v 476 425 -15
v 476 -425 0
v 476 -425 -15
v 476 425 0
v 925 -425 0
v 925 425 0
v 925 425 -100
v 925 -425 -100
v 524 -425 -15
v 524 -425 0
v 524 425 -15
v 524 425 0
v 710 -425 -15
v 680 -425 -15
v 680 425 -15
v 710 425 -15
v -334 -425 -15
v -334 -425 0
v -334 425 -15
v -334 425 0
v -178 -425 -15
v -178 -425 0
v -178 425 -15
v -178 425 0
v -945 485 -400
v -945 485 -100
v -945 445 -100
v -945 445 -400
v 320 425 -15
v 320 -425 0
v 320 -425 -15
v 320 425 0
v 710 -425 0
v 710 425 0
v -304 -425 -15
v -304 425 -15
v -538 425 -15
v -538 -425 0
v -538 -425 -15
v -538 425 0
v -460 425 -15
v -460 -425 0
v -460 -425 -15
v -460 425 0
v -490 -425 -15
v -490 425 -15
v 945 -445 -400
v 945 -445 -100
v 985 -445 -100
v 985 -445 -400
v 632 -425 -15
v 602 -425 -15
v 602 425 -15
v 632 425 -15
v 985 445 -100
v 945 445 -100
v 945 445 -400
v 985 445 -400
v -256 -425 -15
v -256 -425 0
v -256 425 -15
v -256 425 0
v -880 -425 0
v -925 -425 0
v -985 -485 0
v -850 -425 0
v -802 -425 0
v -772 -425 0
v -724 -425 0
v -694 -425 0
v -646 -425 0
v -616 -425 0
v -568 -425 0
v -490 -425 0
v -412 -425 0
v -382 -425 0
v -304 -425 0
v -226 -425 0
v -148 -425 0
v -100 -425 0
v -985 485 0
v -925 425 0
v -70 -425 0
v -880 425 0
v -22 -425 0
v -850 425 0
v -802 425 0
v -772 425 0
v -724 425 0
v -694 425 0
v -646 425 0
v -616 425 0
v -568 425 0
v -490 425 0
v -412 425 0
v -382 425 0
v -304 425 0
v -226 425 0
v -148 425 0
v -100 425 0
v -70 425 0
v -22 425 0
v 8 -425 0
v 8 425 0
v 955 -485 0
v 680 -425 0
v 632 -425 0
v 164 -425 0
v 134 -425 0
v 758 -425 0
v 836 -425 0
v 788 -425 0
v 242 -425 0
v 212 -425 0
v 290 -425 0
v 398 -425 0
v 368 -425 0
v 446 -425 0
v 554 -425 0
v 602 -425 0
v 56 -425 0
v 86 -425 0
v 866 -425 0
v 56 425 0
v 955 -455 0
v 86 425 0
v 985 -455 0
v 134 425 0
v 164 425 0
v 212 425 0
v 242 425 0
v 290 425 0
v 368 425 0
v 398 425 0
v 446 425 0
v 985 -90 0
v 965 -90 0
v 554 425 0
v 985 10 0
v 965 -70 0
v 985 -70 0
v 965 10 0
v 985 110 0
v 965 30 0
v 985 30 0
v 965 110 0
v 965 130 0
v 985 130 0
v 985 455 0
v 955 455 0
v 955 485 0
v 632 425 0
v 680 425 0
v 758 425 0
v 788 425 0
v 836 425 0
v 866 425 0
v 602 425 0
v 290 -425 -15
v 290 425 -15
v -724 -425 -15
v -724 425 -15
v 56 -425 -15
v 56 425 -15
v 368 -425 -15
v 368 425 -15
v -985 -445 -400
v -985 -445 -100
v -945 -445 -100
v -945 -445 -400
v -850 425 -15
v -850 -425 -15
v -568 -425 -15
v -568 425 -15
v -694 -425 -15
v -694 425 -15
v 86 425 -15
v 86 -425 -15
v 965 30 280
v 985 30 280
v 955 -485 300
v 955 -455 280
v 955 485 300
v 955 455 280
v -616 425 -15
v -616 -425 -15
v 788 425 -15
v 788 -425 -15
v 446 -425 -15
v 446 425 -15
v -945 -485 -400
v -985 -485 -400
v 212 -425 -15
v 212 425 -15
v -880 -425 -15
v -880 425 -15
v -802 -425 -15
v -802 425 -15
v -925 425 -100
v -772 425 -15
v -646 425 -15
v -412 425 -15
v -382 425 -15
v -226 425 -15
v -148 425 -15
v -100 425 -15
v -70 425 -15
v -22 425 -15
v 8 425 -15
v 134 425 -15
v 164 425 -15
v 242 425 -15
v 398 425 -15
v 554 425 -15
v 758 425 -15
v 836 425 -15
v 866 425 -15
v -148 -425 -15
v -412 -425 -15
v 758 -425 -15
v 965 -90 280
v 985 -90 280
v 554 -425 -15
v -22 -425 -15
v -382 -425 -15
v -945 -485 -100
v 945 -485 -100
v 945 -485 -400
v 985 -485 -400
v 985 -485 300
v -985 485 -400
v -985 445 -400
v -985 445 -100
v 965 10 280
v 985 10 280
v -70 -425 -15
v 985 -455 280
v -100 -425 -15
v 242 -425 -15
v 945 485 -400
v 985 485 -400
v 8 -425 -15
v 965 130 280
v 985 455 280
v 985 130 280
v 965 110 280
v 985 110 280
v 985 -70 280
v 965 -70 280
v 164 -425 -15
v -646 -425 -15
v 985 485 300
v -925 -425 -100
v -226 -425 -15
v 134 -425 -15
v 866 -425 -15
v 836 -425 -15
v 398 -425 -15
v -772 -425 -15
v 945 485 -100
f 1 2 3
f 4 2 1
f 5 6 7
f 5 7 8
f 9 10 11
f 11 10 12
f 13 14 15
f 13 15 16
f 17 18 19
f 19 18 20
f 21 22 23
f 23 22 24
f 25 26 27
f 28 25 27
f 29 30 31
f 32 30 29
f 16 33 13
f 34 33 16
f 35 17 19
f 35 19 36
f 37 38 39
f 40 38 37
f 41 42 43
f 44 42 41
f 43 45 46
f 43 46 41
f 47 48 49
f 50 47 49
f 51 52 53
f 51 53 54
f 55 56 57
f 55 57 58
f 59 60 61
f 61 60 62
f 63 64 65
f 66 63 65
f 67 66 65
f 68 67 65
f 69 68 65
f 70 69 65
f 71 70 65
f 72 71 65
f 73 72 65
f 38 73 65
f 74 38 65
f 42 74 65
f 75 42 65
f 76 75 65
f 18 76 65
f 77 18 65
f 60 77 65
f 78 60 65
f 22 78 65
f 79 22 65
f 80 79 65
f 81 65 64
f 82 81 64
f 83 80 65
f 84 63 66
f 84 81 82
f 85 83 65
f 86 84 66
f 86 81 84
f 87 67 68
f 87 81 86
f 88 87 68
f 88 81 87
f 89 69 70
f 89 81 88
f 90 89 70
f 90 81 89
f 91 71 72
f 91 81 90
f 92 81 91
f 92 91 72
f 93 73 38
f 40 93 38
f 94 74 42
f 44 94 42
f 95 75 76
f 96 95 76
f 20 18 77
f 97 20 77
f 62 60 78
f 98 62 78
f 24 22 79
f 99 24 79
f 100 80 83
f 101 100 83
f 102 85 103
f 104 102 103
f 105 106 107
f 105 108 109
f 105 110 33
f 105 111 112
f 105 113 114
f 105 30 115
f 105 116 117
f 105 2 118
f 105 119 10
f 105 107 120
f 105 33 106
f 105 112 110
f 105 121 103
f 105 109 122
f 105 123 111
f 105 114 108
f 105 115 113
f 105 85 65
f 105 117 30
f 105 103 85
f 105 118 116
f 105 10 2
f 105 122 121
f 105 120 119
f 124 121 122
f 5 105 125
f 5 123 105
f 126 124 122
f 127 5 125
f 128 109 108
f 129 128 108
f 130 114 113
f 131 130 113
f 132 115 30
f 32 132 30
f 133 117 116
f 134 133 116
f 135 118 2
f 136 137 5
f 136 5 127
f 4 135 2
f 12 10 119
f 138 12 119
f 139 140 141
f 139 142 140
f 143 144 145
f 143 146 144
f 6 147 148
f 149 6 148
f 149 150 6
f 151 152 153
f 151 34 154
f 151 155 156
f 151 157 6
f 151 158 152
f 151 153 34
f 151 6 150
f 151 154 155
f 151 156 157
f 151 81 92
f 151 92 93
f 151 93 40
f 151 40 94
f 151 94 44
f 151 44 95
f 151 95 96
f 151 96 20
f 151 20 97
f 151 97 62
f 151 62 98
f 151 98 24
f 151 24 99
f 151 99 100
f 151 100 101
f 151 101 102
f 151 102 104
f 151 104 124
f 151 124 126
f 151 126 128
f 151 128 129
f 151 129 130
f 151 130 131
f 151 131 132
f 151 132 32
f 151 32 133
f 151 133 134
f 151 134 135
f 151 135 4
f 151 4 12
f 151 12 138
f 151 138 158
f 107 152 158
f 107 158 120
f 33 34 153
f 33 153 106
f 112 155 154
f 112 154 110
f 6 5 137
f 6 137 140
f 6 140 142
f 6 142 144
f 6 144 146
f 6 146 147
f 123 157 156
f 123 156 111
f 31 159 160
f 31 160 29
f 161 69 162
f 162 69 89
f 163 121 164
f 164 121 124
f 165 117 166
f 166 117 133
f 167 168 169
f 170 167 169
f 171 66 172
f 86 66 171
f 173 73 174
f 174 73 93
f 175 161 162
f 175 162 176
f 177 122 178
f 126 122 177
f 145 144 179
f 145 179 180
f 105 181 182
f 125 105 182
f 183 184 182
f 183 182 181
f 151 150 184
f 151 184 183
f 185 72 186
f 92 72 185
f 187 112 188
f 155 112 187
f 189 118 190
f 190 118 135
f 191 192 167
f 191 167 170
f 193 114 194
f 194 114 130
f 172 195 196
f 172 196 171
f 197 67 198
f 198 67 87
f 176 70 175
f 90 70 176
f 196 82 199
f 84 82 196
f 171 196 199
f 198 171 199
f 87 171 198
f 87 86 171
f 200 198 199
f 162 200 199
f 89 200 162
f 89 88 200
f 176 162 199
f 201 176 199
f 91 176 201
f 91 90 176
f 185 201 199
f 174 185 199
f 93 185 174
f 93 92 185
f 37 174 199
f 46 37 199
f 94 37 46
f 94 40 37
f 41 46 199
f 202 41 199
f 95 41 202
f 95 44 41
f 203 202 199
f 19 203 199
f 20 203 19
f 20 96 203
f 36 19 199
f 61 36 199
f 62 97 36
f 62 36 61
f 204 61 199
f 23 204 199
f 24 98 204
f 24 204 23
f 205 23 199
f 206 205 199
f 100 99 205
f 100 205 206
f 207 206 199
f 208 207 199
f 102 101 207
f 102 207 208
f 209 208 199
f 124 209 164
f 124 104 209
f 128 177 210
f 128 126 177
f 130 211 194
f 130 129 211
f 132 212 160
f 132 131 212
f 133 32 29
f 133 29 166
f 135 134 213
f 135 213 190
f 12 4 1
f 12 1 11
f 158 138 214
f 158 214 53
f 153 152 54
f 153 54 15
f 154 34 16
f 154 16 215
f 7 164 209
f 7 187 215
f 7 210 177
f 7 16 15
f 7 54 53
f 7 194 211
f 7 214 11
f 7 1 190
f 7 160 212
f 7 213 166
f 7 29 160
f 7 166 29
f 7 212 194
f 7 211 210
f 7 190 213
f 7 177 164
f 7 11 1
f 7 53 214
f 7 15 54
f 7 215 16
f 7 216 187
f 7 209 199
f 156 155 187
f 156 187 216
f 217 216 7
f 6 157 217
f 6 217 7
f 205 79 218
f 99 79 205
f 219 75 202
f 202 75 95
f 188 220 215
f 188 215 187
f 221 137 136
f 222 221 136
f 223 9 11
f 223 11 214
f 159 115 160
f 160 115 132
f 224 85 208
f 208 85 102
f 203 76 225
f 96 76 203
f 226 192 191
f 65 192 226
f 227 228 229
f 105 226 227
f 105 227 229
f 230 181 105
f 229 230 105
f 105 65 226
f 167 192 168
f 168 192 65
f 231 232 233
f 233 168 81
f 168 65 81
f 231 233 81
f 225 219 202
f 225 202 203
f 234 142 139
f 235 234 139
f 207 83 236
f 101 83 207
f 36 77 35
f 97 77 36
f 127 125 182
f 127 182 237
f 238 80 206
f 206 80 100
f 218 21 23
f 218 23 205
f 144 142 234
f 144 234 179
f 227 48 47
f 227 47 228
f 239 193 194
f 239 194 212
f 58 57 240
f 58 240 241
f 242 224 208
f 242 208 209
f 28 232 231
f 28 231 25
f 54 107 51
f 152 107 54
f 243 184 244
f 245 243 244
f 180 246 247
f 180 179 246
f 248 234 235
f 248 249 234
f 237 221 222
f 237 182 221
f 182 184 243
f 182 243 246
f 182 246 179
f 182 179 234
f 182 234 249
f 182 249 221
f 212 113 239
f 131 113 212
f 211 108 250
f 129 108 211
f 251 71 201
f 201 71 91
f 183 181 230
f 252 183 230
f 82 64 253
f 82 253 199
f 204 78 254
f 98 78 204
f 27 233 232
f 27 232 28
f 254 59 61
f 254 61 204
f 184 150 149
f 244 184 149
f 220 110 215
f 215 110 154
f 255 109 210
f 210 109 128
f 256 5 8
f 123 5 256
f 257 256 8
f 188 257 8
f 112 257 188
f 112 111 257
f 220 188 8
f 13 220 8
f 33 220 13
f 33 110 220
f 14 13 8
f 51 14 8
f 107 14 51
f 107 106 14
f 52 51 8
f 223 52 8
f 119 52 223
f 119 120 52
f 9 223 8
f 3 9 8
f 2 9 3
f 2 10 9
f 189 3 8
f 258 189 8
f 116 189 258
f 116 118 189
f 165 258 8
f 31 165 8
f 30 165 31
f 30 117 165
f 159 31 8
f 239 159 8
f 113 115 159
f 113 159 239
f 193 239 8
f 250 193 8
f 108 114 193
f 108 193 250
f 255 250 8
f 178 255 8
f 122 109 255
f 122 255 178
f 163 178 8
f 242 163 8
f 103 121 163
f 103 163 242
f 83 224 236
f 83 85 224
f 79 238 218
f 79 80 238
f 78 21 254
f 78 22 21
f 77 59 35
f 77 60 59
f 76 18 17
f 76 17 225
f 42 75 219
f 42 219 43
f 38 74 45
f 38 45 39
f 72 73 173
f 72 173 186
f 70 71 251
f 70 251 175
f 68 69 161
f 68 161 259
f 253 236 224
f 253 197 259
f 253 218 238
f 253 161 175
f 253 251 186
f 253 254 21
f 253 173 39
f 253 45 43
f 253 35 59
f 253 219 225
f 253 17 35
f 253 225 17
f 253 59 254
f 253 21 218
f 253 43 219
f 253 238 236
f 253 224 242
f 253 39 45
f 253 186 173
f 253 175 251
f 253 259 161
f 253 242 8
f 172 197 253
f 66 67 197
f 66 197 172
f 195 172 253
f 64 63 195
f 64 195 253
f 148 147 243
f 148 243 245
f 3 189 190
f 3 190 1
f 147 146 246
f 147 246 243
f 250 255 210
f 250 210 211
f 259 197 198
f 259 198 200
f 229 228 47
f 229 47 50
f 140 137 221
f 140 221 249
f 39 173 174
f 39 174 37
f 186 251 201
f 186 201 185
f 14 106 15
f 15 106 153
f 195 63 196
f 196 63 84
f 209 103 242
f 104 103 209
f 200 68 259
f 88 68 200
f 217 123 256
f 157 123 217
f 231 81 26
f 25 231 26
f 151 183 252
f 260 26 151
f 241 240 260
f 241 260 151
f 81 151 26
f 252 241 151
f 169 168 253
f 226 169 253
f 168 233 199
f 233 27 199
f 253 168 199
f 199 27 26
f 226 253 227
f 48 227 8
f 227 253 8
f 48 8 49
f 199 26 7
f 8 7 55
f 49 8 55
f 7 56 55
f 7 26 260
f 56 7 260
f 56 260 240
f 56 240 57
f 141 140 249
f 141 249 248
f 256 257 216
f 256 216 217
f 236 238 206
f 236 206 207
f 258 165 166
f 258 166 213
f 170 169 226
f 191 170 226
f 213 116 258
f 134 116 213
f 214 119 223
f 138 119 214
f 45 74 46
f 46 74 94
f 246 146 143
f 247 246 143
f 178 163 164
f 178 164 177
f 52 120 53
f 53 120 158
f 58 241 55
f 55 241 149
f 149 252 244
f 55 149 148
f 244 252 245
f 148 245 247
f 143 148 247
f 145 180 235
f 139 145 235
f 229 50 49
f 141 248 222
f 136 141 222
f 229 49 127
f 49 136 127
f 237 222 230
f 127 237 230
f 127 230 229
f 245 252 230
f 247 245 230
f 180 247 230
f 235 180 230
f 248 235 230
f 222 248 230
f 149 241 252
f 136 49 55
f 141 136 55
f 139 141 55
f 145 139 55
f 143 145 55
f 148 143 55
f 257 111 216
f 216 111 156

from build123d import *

# Parameters (mm, degrees)
F0_W     = 1970
F0_H     = 970
F0_W_2   = 30
F0_H_2   = 850
F1_DEPTH = 15
F2_DEPTH = 100
F3_W     = 30
F3_H     = 30
F3_W_2   = 20
F3_H_2   = 20
F4_DEPTH = 300
F5_W     = 30
F5_H     = 20
F6_DEPTH = 970
F7_W     = 40
F7_H     = 40
F8_DEPTH = 300


with BuildPart() as f1:
    # F0 (on Top) → F1 (new body)
    with BuildSketch(Plane.XY):
        Rectangle(F0_W, F0_H)
        Polygon((-925, -425), (-925, 425), (-880, 425), (-850, 425), (-802, 425), (-772, 425), (-724, 425), (-694, 425), (-646, 425), (-616, 425), (-568, 425), (-538, 425), (-490, 425), (-460, 425), (-412, 425), (-382, 425), (-334, 425), (-304, 425), (-256, 425), (-226, 425), (-178, 425), (-148, 425), (-100, 425), (-70, 425), (-22, 425), (8, 425), (56, 425), (86, 425), (134, 425), (164, 425), (212, 425), (242, 425), (290, 425), (320, 425), (368, 425), (398, 425), (446, 425), (476, 425), (524, 425), (554, 425), (602, 425), (632, 425), (680, 425), (710, 425), (758, 425), (788, 425), (836, 425), (866, 425), (925, 425), (925, -425), (866, -425), (836, -425), (788, -425), (758, -425), (710, -425), (680, -425), (632, -425), (602, -425), (554, -425), (524, -425), (476, -425), (446, -425), (398, -425), (368, -425), (320, -425), (290, -425), (242, -425), (212, -425), (164, -425), (134, -425), (86, -425), (56, -425), (8, -425), (-22, -425), (-70, -425), (-100, -425), (-148, -425), (-178, -425), (-226, -425), (-256, -425), (-304, -425), (-334, -425), (-382, -425), (-412, -425), (-460, -425), (-490, -425), (-538, -425), (-568, -425), (-616, -425), (-646, -425), (-694, -425), (-724, -425), (-772, -425), (-802, -425), (-850, -425), (-880, -425), align=None, mode=Mode.SUBTRACT)
        with Locations((-865, 0)):
            Rectangle(F0_W_2, F0_H_2)
        with Locations((-787, 0)):
            Rectangle(F0_W_2, F0_H_2)
        with Locations((-709, 0)):
            Rectangle(F0_W_2, F0_H_2)
        with Locations((-631, 0)):
            Rectangle(F0_W_2, F0_H_2)
        with Locations((-553, 0)):
            Rectangle(F0_W_2, F0_H_2)
        with Locations((-475, 0)):
            Rectangle(F0_W_2, F0_H_2)
        with Locations((-397, 0)):
            Rectangle(F0_W_2, F0_H_2)
        with Locations((-319, 0)):
            Rectangle(F0_W_2, F0_H_2)
        with Locations((-241, 0)):
            Rectangle(F0_W_2, F0_H_2)
        with Locations((-163, 0)):
            Rectangle(F0_W_2, F0_H_2)
        with Locations((-85, 0)):
            Rectangle(F0_W_2, F0_H_2)
        with Locations((-7, 0)):
            Rectangle(F0_W_2, F0_H_2)
        with Locations((71, 0)):
            Rectangle(F0_W_2, F0_H_2)
        with Locations((149, 0)):
            Rectangle(F0_W_2, F0_H_2)
        with Locations((227, 0)):
            Rectangle(F0_W_2, F0_H_2)
        with Locations((305, 0)):
            Rectangle(F0_W_2, F0_H_2)
        with Locations((383, 0)):
            Rectangle(F0_W_2, F0_H_2)
        with Locations((461, 0)):
            Rectangle(F0_W_2, F0_H_2)
        with Locations((539, 0)):
            Rectangle(F0_W_2, F0_H_2)
        with Locations((617, 0)):
            Rectangle(F0_W_2, F0_H_2)
        with Locations((695, 0)):
            Rectangle(F0_W_2, F0_H_2)
        with Locations((773, 0)):
            Rectangle(F0_W_2, F0_H_2)
        with Locations((851, 0)):
            Rectangle(F0_W_2, F0_H_2)
    extrude(amount=-F1_DEPTH)

    # F0 (on Top) → F2 (join)
    with BuildSketch(Plane.XY):
        Rectangle(F0_W, F0_H)
        Polygon((-925, -425), (-925, 425), (-880, 425), (-850, 425), (-802, 425), (-772, 425), (-724, 425), (-694, 425), (-646, 425), (-616, 425), (-568, 425), (-538, 425), (-490, 425), (-460, 425), (-412, 425), (-382, 425), (-334, 425), (-304, 425), (-256, 425), (-226, 425), (-178, 425), (-148, 425), (-100, 425), (-70, 425), (-22, 425), (8, 425), (56, 425), (86, 425), (134, 425), (164, 425), (212, 425), (242, 425), (290, 425), (320, 425), (368, 425), (398, 425), (446, 425), (476, 425), (524, 425), (554, 425), (602, 425), (632, 425), (680, 425), (710, 425), (758, 425), (788, 425), (836, 425), (866, 425), (925, 425), (925, -425), (866, -425), (836, -425), (788, -425), (758, -425), (710, -425), (680, -425), (632, -425), (602, -425), (554, -425), (524, -425), (476, -425), (446, -425), (398, -425), (368, -425), (320, -425), (290, -425), (242, -425), (212, -425), (164, -425), (134, -425), (86, -425), (56, -425), (8, -425), (-22, -425), (-70, -425), (-100, -425), (-148, -425), (-178, -425), (-226, -425), (-256, -425), (-304, -425), (-334, -425), (-382, -425), (-412, -425), (-460, -425), (-490, -425), (-538, -425), (-568, -425), (-616, -425), (-646, -425), (-694, -425), (-724, -425), (-772, -425), (-802, -425), (-850, -425), (-880, -425), align=None, mode=Mode.SUBTRACT)
    extrude(amount=-F2_DEPTH)

    # F3 (on face) → F4 (join)
    with BuildSketch(Plane.XY):
        with Locations((970, 470)):
            Rectangle(F3_W, F3_H)
        with Locations((970, -470)):
            Rectangle(F3_W, F3_H)
        with Locations((975, -80)):
            Rectangle(F3_W_2, F3_H_2)
        with Locations((975, 20)):
            Rectangle(F3_W_2, F3_H_2)
        with Locations((975, 120)):
            Rectangle(F3_W_2, F3_H_2)
    extrude(amount=F4_DEPTH)

    # F5 (on face) → F6 (join, through all)
    with BuildSketch(Plane.XZ.offset(485)):
        with Locations((970, 290)):
            Rectangle(F5_W, F5_H)
    extrude(amount=-F6_DEPTH)

    # F7 (on face) → F8 (join)
    with BuildSketch(Plane(origin=(0, 0, -100), x_dir=(1, 0, 0), z_dir=(0, 0, -1))):
        with Locations((965, 465)):
            Rectangle(F7_W, F7_H)
        with Locations((-965, 465)):
            Rectangle(F7_W, F7_H)
        with Locations((-965, -465)):
            Rectangle(F7_W, F7_H)
        with Locations((965, -465)):
            Rectangle(F7_W, F7_H)
    extrude(amount=F8_DEPTH)


solid = f1.part
